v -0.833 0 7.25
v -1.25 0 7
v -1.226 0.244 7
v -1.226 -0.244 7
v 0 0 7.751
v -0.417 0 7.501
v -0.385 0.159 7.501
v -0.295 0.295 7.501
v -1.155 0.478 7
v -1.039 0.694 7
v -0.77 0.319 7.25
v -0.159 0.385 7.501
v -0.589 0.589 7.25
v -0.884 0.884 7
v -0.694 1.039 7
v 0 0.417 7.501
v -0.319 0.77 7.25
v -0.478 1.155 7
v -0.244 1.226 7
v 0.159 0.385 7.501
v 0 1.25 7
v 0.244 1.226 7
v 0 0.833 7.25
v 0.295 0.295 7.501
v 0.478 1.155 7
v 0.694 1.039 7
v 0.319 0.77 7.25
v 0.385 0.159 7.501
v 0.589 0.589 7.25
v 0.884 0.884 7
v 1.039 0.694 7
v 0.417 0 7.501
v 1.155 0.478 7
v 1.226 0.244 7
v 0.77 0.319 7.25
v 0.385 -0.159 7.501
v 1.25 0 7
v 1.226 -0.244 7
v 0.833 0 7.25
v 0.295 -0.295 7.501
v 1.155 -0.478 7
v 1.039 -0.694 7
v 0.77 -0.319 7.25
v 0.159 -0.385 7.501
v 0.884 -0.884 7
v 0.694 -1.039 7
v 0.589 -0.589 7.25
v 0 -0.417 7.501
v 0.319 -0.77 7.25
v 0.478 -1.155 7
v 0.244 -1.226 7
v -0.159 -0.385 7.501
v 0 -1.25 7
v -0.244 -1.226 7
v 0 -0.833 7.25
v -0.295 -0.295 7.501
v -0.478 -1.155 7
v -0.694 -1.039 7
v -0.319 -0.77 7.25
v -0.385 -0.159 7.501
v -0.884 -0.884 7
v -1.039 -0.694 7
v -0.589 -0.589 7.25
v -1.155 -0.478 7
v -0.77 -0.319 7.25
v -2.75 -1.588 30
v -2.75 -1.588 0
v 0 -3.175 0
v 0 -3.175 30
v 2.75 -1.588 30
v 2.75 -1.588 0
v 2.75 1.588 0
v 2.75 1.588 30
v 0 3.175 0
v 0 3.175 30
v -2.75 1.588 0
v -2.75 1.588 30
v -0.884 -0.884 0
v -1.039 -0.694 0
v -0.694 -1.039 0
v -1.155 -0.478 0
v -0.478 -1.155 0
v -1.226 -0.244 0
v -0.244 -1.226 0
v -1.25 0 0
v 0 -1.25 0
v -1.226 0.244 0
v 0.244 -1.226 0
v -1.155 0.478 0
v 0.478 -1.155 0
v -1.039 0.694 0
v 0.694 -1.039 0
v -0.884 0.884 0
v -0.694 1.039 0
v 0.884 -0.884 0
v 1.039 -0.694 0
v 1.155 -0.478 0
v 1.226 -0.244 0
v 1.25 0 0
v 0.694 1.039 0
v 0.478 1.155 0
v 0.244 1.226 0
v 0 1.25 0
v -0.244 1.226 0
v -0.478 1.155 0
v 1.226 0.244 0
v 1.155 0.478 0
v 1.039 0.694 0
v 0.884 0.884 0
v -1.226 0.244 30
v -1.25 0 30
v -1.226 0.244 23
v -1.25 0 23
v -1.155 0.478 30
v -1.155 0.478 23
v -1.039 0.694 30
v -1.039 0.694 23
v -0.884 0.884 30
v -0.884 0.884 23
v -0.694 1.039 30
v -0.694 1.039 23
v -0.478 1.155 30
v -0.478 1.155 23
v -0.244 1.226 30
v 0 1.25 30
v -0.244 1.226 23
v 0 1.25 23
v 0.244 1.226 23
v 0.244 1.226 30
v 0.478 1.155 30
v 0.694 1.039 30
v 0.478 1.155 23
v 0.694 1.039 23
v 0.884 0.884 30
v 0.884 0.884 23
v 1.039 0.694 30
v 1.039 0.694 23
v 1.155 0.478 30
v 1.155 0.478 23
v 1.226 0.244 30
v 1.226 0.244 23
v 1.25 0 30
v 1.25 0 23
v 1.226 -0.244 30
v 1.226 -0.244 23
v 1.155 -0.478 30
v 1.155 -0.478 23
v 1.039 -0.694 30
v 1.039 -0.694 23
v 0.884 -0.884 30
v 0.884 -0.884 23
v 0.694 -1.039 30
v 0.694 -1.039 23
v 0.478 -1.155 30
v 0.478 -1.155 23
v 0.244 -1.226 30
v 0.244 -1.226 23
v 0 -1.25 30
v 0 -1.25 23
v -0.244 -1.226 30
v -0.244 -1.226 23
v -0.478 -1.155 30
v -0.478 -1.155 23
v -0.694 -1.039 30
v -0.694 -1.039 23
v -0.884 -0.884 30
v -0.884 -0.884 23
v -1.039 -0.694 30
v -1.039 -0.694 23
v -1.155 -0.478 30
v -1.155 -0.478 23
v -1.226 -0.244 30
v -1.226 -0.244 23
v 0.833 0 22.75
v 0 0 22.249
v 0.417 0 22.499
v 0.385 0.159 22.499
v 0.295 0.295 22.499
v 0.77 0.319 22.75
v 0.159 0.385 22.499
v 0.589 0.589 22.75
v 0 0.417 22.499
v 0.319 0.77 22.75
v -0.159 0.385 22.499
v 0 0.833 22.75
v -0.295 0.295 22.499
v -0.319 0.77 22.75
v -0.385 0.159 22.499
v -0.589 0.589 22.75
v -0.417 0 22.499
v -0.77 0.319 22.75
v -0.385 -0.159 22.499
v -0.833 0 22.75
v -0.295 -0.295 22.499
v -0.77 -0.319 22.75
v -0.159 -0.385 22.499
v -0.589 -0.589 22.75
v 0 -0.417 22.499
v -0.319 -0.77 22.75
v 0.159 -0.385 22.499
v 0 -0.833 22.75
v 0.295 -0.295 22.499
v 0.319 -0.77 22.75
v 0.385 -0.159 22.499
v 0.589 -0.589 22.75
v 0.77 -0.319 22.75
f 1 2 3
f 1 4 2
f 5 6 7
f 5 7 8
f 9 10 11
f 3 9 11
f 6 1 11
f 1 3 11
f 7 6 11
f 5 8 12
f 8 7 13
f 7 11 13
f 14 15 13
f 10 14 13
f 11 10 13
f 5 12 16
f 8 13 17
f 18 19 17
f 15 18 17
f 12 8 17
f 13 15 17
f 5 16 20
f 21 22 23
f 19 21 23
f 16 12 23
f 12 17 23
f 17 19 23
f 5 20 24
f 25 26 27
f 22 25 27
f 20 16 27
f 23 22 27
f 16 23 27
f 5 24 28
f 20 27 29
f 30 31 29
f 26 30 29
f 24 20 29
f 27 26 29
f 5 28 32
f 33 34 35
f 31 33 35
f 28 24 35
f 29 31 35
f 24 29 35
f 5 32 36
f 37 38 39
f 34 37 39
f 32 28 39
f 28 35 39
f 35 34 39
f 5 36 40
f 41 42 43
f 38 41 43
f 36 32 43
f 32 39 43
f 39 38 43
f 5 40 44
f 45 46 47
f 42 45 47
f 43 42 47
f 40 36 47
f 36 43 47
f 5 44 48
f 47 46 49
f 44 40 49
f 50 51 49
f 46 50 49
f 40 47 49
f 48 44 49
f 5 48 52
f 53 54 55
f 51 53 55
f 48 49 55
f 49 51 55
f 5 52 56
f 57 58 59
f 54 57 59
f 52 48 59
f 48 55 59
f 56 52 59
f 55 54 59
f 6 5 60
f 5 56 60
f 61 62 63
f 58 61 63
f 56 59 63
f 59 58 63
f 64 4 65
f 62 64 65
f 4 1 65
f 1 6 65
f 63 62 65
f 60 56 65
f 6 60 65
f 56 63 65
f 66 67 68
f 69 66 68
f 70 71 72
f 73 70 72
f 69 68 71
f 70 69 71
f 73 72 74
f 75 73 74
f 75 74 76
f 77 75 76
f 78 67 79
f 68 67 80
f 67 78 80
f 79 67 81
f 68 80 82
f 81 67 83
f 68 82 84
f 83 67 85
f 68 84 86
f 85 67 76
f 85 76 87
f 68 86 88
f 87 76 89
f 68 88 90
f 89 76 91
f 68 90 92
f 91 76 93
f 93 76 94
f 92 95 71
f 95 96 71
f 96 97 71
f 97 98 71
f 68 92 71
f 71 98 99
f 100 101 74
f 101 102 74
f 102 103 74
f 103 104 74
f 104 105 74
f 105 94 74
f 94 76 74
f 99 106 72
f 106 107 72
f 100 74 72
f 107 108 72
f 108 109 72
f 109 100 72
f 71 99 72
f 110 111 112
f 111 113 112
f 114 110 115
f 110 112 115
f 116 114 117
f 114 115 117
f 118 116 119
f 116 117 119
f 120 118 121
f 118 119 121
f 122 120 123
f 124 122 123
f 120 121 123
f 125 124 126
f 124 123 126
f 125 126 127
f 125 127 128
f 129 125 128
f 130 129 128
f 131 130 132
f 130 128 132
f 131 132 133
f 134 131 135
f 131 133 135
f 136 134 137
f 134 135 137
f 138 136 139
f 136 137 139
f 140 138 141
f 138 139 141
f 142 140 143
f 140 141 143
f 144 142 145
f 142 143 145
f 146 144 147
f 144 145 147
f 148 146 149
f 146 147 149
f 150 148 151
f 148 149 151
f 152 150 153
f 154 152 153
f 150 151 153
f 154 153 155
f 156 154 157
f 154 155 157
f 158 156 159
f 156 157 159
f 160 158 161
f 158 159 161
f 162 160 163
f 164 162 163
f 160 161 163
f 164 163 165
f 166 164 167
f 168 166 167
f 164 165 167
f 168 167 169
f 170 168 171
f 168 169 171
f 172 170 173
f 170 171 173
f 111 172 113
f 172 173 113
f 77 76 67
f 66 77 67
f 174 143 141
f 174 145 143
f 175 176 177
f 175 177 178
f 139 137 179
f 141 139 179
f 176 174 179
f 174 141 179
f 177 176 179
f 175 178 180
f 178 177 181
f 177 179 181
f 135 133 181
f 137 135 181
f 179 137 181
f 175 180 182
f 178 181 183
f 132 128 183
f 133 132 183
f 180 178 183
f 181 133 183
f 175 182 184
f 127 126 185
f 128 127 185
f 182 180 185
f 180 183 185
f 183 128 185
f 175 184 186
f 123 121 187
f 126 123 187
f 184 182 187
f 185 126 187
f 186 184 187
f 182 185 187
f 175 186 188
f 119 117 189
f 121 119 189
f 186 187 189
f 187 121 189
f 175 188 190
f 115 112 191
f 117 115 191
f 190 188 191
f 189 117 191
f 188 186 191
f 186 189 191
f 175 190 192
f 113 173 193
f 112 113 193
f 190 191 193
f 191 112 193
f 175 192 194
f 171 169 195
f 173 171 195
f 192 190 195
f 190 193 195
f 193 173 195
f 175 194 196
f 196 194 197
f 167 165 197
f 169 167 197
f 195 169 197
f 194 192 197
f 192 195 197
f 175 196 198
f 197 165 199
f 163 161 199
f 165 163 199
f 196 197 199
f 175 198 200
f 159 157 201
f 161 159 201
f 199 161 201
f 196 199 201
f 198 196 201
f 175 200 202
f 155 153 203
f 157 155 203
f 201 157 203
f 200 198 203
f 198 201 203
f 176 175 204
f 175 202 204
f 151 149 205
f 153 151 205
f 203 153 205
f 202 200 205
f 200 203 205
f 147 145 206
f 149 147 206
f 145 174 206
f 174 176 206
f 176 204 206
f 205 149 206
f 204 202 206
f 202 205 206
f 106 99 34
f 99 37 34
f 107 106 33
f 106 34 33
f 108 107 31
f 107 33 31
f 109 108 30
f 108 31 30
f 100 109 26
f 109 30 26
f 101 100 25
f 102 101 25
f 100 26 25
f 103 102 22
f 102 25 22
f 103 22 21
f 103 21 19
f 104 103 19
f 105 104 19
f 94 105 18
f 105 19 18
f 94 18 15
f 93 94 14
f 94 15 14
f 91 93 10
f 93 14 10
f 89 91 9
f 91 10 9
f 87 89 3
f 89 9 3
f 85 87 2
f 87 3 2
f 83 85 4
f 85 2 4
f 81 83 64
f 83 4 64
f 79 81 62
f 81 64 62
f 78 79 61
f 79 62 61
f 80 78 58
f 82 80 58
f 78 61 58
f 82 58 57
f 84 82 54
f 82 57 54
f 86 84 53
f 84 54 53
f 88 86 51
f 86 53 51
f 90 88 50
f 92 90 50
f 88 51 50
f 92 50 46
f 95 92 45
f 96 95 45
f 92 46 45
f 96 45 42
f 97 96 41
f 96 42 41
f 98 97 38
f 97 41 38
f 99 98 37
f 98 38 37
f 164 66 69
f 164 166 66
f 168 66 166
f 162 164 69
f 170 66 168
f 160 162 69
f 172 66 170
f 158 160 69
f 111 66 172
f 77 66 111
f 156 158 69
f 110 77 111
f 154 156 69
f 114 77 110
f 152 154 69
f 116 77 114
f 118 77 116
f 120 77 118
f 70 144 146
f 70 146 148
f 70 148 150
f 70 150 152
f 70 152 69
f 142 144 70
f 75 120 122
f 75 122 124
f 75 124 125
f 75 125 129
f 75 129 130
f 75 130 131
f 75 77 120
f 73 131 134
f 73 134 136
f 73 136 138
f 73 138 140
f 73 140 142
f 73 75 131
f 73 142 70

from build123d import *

# Parameters (mm, degrees)
BOSS_EXTRU_1_DEPTH                            = 30
TROU_POUR_TARAUDAGE_POUR_TROU_TARAUD_M3_D     = 2.5
TROU_POUR_TARAUDAGE_POUR_TROU_TARAUD_M3_DEPTH = 7
TROU_POUR_TARAUDAGE_POUR_TROU_TARAUD_M3_TIP   = 0.751075774
TROU_POUR_TARAUDAGE_POUR_TROU_TARAUD_2_D      = 2.5
TROU_POUR_TARAUDAGE_POUR_TROU_TARAUD_2_DEPTH  = 7
TROU_POUR_TARAUDAGE_POUR_TROU_TARAUD_2_TIP    = 0.751075774


with BuildPart() as part:
    # Esquisse1 → Boss.-Extru.1 (new body)
    with BuildSketch(Plane.XY):
        Polygon((0, -3.175426481), (2.75, -1.58771324), (2.75, 1.58771324), (0, 3.175426481), (-2.75, 1.58771324), (-2.75, -1.58771324), align=None)
    extrude(amount=BOSS_EXTRU_1_DEPTH)

    # Trou pour taraudage pour trou taraud_ M3
    with Locations(Plane.XY.offset(30)):
        with Locations((0, 0)):
            Hole(TROU_POUR_TARAUDAGE_POUR_TROU_TARAUD_M3_D / 2, depth=TROU_POUR_TARAUDAGE_POUR_TROU_TARAUD_M3_DEPTH)
            with Locations((0, 0, -(TROU_POUR_TARAUDAGE_POUR_TROU_TARAUD_M3_DEPTH + TROU_POUR_TARAUDAGE_POUR_TROU_TARAUD_M3_TIP / 2))):  # 118° drill point
                Cone(0, TROU_POUR_TARAUDAGE_POUR_TROU_TARAUD_M3_D / 2, TROU_POUR_TARAUDAGE_POUR_TROU_TARAUD_M3_TIP, mode=Mode.SUBTRACT)

    # Trou pour taraudage pour trou taraud 2
    with Locations(Plane(origin=(0, 0, 0), x_dir=(-1, 0, 0), z_dir=(0, 0, -1))):
        with Locations((0, 0)):
            Hole(TROU_POUR_TARAUDAGE_POUR_TROU_TARAUD_2_D / 2, depth=TROU_POUR_TARAUDAGE_POUR_TROU_TARAUD_2_DEPTH)
            with Locations((0, 0, -(TROU_POUR_TARAUDAGE_POUR_TROU_TARAUD_2_DEPTH + TROU_POUR_TARAUDAGE_POUR_TROU_TARAUD_2_TIP / 2))):  # 118° drill point
                Cone(0, TROU_POUR_TARAUDAGE_POUR_TROU_TARAUD_2_D / 2, TROU_POUR_TARAUDAGE_POUR_TROU_TARAUD_2_TIP, mode=Mode.SUBTRACT)


solid = part.part
